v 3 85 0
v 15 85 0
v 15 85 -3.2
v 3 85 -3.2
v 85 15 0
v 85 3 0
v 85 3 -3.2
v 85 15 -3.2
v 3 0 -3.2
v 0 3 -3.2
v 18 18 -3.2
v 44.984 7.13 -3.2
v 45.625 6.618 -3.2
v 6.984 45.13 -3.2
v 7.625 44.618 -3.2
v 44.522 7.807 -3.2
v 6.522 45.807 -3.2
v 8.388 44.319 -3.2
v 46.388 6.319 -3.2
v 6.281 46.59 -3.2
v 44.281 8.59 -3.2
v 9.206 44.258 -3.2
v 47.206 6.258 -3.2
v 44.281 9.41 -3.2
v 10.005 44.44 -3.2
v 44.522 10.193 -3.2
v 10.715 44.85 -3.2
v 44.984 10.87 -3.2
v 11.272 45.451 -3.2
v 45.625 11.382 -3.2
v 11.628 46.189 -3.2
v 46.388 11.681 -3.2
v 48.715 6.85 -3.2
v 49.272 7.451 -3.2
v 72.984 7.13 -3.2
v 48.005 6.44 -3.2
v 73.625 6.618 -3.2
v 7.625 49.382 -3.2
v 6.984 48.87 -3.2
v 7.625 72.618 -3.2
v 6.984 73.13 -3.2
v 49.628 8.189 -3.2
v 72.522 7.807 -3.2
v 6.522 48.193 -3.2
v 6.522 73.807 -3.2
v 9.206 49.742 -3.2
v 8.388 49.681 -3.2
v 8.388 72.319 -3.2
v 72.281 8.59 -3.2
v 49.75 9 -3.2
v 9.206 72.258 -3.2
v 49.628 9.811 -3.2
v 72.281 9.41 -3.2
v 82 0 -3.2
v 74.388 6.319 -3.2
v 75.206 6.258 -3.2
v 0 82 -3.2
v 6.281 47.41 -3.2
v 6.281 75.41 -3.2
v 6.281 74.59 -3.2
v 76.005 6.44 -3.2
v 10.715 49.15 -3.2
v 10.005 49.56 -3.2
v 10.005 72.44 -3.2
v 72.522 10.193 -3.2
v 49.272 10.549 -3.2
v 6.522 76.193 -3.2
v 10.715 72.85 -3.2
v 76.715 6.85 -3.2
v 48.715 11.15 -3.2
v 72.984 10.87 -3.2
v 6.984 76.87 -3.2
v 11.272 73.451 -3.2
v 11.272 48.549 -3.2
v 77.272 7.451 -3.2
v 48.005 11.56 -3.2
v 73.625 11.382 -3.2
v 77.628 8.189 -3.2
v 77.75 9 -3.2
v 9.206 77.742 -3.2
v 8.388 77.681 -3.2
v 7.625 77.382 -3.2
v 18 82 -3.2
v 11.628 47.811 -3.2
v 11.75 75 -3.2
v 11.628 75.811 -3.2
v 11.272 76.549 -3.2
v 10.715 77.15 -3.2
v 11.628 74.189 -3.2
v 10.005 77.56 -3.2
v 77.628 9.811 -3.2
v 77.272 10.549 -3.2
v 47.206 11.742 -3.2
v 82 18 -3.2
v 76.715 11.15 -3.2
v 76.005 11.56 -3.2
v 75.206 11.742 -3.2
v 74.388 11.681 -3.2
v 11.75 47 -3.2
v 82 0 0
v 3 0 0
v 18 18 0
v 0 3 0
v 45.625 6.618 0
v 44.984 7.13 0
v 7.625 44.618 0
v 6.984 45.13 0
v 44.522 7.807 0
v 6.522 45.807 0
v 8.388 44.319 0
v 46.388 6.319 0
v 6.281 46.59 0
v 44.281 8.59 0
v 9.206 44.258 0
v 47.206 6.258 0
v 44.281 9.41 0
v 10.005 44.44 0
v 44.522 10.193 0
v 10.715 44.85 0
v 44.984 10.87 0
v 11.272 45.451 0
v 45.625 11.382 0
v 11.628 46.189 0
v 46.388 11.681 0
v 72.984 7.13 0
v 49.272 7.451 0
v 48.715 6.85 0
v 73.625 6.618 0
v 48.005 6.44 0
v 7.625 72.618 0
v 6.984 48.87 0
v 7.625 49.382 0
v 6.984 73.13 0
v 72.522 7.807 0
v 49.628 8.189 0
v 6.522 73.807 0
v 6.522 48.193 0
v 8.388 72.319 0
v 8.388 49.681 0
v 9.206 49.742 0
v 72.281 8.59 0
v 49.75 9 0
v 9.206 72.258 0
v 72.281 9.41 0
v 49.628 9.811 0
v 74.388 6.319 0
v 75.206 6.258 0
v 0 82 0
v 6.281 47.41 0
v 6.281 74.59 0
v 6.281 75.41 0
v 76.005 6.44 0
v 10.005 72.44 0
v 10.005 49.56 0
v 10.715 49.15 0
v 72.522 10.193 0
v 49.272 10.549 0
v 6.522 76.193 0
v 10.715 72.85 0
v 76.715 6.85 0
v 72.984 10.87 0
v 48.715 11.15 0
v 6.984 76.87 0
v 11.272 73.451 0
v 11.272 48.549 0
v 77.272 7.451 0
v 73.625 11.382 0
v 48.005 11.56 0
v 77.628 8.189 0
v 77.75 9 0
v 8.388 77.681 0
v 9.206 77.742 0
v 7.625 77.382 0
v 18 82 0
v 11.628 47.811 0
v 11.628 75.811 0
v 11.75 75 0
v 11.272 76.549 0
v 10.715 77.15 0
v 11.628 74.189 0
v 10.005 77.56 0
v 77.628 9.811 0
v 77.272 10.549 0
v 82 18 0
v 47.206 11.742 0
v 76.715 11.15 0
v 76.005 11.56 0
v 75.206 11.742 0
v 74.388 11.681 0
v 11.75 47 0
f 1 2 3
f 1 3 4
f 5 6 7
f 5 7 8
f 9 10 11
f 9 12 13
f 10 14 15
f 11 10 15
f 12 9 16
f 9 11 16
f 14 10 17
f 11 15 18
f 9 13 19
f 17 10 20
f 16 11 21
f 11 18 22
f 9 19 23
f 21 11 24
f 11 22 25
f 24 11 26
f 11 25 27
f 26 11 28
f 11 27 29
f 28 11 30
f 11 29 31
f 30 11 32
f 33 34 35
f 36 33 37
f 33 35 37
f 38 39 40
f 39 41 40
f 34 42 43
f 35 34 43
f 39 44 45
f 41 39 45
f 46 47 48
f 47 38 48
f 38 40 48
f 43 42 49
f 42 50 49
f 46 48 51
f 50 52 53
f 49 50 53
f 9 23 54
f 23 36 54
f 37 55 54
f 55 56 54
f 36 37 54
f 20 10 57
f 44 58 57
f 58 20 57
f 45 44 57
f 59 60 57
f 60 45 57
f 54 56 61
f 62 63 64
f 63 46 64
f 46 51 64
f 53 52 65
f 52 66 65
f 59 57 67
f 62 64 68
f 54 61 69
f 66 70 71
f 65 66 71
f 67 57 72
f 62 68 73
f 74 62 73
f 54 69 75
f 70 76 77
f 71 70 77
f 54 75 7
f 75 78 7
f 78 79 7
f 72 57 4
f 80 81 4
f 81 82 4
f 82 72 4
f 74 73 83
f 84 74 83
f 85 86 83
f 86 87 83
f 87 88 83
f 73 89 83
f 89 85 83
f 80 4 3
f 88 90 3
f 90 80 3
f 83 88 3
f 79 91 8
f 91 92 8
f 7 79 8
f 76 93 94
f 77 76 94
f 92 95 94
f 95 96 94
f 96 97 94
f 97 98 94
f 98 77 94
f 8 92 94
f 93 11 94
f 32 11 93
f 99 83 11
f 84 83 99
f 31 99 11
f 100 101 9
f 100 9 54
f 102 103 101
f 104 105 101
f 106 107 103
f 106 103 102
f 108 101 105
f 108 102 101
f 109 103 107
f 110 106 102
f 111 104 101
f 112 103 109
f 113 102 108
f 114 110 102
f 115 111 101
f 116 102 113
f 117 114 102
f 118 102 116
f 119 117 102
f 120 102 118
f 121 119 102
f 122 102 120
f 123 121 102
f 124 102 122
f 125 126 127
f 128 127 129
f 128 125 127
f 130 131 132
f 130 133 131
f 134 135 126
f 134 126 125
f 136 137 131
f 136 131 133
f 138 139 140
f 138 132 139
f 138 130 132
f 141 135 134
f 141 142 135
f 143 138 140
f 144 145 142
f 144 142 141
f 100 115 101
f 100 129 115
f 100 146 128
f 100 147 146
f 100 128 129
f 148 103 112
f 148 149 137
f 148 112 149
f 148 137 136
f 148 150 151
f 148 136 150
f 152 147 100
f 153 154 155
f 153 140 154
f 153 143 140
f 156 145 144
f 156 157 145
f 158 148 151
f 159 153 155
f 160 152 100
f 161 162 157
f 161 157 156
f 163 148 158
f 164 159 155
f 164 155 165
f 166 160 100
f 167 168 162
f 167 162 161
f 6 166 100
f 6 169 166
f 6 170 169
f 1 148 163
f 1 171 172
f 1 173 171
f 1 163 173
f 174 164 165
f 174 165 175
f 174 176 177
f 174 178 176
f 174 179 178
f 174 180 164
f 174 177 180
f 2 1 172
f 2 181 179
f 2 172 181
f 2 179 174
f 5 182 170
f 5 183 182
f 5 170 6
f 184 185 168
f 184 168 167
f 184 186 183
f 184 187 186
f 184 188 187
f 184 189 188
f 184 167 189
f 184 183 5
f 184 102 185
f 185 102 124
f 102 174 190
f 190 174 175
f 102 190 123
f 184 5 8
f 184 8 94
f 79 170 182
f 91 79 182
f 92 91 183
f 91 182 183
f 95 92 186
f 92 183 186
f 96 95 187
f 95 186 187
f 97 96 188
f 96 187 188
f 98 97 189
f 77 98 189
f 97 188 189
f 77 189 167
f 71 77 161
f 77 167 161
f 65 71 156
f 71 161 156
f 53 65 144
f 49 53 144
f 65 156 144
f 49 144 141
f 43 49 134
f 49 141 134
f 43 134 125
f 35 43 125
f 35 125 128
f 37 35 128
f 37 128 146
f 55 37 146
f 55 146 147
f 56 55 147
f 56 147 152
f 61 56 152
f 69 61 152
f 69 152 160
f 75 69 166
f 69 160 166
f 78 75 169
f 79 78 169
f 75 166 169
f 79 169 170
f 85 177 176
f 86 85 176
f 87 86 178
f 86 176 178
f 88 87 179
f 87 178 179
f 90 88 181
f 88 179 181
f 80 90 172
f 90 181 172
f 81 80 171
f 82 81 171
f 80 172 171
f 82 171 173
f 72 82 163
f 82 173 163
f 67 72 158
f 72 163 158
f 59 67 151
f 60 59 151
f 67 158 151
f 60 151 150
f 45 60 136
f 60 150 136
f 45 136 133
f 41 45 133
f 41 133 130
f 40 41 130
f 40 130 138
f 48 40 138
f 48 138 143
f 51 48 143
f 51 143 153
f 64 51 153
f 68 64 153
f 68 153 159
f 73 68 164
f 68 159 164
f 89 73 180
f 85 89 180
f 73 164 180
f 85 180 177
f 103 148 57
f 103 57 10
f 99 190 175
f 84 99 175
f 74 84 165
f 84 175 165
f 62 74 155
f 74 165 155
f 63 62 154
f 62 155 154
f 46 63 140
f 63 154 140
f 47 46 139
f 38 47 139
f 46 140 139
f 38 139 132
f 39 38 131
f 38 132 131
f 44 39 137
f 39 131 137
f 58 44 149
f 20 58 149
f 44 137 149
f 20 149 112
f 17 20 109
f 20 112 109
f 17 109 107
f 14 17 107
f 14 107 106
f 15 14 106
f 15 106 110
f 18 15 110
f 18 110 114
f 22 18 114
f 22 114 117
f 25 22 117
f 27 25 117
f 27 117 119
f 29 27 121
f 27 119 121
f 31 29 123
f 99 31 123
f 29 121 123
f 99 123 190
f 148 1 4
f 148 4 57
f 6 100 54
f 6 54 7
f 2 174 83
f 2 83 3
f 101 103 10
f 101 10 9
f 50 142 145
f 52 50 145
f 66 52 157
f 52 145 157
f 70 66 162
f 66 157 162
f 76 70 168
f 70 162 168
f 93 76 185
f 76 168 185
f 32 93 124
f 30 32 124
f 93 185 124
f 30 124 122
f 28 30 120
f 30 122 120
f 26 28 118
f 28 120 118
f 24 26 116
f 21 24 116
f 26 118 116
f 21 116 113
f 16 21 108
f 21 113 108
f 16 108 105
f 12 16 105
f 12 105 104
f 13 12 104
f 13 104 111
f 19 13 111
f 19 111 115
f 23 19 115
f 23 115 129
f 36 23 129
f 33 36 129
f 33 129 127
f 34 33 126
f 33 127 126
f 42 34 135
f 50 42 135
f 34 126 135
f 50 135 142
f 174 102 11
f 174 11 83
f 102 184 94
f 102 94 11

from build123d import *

# Parameters (mm, degrees)
SKETCH1_R           = 2.75
BOSS_EXTRUDE1_DEPTH = 3.2


with BuildPart() as part:
    # Sketch1 → Boss-Extrude1 (new body)
    with BuildSketch(Plane.XY):
        Polygon((0, 82), (0, 3), (3, 0), (82, 0), (85, 3), (85, 15), (82, 18), (18, 18), (18, 82), (15, 85), (3, 85), align=None)
        with Locations((75, 9)):
            Circle(SKETCH1_R, mode=Mode.SUBTRACT)
        with Locations((47, 9)):
            Circle(SKETCH1_R, mode=Mode.SUBTRACT)
        with Locations((9, 47)):
            Circle(SKETCH1_R, mode=Mode.SUBTRACT)
        with Locations((9, 75)):
            Circle(SKETCH1_R, mode=Mode.SUBTRACT)
    extrude(amount=-BOSS_EXTRUDE1_DEPTH)


solid = part.part
